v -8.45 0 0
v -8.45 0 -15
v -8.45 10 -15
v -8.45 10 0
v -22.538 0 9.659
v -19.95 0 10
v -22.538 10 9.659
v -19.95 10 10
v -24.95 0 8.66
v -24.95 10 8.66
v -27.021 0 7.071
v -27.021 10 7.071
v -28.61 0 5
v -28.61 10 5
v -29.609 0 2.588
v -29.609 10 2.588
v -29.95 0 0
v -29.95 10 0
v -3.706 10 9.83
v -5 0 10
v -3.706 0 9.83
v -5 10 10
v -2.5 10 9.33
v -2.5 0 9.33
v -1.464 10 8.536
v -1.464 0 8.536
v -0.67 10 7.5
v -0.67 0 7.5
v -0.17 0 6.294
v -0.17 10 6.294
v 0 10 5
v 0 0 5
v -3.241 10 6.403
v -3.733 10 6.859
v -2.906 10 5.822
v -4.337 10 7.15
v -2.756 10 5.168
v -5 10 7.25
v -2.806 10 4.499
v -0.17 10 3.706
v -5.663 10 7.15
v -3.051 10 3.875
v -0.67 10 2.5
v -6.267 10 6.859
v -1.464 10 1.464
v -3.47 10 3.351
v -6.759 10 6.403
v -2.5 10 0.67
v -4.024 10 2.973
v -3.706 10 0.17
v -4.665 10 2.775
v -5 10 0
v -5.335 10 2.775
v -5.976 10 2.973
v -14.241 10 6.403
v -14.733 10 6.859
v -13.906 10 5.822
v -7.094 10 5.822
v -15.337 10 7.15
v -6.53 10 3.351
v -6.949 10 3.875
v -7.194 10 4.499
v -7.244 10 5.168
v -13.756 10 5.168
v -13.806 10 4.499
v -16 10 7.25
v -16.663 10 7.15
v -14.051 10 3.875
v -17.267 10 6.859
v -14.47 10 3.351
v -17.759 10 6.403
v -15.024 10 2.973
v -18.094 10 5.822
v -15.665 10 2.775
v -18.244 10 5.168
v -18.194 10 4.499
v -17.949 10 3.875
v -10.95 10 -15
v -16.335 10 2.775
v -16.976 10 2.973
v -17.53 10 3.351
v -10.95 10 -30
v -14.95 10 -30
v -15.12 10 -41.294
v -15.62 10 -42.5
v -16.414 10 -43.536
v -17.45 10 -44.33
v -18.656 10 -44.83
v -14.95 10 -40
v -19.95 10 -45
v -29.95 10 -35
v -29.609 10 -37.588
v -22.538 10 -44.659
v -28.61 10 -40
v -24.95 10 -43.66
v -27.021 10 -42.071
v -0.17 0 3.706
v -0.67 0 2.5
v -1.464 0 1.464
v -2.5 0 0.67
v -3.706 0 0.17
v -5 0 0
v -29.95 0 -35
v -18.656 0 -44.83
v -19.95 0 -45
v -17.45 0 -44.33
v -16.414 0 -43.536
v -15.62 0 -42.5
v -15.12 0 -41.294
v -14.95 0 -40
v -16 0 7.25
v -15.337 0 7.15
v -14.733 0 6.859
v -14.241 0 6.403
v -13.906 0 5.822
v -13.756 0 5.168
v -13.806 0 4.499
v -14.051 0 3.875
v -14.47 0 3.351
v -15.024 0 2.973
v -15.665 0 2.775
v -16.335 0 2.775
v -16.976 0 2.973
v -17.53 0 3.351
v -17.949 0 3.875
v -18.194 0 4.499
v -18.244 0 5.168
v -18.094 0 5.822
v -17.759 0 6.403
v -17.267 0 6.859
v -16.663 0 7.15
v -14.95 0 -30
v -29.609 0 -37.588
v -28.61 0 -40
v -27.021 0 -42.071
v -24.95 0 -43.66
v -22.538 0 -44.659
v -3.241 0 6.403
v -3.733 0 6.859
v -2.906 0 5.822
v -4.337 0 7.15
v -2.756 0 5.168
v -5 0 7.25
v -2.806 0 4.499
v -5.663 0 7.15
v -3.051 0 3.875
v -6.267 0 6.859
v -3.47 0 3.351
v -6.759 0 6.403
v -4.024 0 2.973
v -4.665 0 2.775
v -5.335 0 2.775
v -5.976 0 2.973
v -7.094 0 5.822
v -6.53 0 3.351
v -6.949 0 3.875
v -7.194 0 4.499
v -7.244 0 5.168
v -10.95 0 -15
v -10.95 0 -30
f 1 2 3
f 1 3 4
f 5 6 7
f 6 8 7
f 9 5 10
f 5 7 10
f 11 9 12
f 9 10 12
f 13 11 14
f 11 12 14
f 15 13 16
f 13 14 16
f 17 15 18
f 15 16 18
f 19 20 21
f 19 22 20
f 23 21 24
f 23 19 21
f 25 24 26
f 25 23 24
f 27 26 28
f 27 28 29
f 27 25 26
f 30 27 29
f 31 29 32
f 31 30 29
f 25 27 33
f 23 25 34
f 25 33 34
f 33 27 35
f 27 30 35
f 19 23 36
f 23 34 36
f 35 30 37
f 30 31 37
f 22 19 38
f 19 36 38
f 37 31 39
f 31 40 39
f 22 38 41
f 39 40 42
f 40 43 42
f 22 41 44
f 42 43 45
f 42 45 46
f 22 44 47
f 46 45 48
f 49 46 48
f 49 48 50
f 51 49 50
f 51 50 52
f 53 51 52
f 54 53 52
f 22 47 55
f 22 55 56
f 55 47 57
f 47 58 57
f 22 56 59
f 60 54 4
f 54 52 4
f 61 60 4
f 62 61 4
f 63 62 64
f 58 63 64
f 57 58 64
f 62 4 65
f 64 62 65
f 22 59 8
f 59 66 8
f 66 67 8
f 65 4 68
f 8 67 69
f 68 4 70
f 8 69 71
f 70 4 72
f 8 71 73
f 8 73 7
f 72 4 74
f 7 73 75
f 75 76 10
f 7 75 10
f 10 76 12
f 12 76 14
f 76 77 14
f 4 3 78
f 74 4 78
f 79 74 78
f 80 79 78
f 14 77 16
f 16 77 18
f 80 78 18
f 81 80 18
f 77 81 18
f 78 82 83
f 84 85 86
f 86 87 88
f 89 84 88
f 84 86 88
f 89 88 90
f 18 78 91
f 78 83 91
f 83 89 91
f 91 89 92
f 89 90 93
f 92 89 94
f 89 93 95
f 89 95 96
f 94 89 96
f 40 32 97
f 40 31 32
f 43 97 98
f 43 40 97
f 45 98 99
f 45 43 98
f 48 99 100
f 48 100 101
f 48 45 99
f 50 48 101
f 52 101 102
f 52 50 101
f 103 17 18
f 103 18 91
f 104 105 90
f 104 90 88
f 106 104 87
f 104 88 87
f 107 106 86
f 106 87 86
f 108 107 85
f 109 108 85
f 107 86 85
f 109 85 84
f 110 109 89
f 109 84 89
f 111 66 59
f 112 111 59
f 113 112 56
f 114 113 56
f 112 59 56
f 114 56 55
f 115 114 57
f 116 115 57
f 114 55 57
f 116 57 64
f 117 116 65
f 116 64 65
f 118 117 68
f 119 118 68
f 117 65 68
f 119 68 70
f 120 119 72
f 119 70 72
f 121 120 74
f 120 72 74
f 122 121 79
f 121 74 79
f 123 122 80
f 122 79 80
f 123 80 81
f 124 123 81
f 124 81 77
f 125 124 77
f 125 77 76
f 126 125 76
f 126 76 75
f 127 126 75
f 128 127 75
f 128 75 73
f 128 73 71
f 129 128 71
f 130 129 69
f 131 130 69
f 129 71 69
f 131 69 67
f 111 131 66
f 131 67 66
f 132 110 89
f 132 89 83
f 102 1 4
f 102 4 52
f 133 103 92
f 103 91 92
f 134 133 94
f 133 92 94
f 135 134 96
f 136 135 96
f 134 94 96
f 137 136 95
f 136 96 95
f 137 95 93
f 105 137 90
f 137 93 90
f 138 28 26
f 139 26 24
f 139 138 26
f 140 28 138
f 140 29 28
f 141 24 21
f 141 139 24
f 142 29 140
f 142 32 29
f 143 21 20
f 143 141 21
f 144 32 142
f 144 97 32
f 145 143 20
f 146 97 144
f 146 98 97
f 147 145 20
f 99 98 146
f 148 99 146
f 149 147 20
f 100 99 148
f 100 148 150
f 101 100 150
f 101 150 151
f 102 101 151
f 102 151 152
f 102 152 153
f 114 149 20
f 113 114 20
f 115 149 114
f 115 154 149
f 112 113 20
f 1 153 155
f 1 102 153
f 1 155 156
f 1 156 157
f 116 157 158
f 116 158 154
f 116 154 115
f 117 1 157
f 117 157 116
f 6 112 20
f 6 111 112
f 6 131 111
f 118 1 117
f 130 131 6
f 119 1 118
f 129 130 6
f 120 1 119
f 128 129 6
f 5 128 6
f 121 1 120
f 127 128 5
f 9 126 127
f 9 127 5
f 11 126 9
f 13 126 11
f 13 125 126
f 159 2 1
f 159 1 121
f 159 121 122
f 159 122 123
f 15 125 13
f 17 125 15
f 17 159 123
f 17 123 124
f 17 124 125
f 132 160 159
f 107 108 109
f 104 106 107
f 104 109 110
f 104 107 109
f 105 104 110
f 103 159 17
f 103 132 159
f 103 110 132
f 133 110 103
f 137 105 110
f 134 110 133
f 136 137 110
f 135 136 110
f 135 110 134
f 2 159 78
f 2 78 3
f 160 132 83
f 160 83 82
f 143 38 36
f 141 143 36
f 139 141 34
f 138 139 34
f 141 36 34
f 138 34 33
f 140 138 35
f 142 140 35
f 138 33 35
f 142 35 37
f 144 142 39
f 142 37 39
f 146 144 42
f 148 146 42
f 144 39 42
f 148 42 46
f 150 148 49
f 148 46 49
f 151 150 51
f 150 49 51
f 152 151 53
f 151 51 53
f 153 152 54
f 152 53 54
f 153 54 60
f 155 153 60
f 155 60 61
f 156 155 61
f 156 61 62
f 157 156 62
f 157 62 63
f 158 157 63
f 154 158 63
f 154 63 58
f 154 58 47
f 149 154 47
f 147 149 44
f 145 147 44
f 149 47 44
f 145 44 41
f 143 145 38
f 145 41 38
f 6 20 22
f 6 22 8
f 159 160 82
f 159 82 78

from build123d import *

# Parameters (mm, degrees)
BOSS_EXTRUDE1_DEPTH = 10
SKETCH3_R           = 2.25
CUT_EXTRUDE1_DEPTH  = 10
FILLET1_R           = 10
FILLET2_R           = 5


with BuildPart() as part:
    # Sketch2 → Boss-Extrude1 (new body)
    with BuildSketch(Plane(origin=(0, 0, 0), x_dir=(1, 0, 0), z_dir=(0, 1, 0))):
        Polygon((-8.45, 15), (-8.45, 0), (0, 0), (0, -10), (-29.95, -10), (-29.95, 45), (-14.95, 45), (-14.95, 30), (-10.95, 30), (-10.95, 15), align=None)
    extrude(amount=BOSS_EXTRUDE1_DEPTH)

    # Sketch3 → Cut-Extrude1 (cut)
    with BuildSketch(Plane(origin=(0, 10, 0), x_dir=(1, 0, 0), z_dir=(0, 1, 0))):
        with Locations(Location((-16, -5, 0), (0, 0, 270))):
            Circle(SKETCH3_R)
        with Locations(Location((-5, -5, 0), (0, 0, 270))):
            Circle(SKETCH3_R)
    extrude(amount=-CUT_EXTRUDE1_DEPTH, mode=Mode.SUBTRACT)

    # Fillet1
    fillet1_edges = [part.edges().sort_by_distance(p)[0] for p in [
        (-29.95, 5, 10),
        (-29.95, 5, -45),
    ]]
    fillet(fillet1_edges, radius=FILLET1_R)

    # Fillet2
    fillet2_edges = [part.edges().sort_by_distance(p)[0] for p in [
        (-14.95, 5, -45),
        (0, 5, 0),
        (0, 5, 10),
    ]]
    fillet(fillet2_edges, radius=FILLET2_R - 0.0001)  # a hair under: the kernel refuses the full size


solid = part.part
